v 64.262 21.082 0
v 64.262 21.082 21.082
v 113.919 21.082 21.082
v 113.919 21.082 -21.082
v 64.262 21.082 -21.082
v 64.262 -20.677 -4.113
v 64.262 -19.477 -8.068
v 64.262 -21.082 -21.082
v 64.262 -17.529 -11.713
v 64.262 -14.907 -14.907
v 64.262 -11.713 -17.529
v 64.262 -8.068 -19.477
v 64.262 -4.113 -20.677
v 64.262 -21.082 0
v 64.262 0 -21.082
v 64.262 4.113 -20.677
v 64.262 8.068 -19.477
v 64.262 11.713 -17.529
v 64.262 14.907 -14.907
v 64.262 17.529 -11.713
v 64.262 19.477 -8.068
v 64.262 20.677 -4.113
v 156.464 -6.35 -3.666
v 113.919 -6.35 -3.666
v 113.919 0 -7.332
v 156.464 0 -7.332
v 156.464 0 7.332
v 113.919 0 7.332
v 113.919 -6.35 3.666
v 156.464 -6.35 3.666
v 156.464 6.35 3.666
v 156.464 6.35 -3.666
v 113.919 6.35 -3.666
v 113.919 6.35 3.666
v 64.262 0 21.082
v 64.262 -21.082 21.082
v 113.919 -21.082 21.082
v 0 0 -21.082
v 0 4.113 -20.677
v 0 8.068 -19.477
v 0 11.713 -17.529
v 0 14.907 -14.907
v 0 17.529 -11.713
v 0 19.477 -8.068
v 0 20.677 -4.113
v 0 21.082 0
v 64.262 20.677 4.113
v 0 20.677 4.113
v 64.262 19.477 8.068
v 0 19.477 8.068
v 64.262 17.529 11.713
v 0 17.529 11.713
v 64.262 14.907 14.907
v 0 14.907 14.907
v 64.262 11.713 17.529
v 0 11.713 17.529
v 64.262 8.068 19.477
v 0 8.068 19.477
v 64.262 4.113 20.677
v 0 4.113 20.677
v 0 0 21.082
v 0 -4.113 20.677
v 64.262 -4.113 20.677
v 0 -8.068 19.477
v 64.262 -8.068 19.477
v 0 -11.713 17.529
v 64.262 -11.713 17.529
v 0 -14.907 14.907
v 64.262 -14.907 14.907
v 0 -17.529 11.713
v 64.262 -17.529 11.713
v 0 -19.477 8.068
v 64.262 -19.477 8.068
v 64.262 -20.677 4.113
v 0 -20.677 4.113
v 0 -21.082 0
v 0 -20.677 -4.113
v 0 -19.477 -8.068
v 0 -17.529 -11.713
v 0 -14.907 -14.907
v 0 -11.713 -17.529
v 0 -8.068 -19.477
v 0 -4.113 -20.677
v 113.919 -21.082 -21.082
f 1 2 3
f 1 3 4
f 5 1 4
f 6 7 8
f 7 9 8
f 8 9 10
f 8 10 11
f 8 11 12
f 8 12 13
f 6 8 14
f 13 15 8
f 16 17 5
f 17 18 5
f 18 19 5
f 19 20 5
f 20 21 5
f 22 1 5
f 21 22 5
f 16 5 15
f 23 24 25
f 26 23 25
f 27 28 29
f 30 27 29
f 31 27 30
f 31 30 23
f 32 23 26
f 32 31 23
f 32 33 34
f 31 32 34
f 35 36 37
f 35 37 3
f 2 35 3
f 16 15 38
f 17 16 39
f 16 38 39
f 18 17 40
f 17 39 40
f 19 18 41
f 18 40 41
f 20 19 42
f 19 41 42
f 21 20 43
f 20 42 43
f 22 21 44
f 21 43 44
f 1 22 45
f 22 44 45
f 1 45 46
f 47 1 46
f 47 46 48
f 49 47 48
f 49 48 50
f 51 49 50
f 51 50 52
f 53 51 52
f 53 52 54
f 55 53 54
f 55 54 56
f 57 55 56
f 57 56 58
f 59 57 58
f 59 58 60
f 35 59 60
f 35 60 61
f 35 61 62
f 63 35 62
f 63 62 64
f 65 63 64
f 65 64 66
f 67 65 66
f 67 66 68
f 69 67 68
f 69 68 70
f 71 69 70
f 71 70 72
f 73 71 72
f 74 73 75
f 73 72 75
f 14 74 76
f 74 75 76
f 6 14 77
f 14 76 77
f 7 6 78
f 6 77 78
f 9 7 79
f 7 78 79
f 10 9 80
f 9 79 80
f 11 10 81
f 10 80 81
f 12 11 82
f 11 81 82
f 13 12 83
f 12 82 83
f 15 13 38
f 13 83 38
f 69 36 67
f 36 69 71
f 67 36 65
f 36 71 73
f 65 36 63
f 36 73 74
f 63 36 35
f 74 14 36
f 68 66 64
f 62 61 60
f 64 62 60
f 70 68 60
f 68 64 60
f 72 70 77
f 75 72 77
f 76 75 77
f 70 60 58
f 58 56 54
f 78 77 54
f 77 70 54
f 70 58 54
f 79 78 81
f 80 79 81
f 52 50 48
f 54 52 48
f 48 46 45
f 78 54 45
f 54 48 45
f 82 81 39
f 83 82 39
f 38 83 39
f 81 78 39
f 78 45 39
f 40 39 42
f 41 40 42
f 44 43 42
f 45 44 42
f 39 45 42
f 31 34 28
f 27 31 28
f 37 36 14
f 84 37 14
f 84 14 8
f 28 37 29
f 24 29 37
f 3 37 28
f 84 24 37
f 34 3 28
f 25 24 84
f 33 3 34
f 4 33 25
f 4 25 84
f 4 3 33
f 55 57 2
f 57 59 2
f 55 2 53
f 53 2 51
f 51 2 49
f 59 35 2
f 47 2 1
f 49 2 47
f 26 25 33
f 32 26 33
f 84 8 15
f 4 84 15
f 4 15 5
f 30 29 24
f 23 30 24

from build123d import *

# Parameters (mm, degrees)
SKETCH1_R           = 21.082
BOSS_EXTRUDE1_DEPTH = 64.262
SKETCH2_W           = 42.164
SKETCH2_H           = 42.164
BOSS_EXTRUDE2_DEPTH = 49.657
BOSS_EXTRUDE3_DEPTH = 42.545


with BuildPart() as part:
    # Sketch1 → Boss-Extrude1 (new body)
    with BuildSketch(Plane(origin=(0, 0, 0), x_dir=(0, 0, -1), z_dir=(1, 0, 0))):
        Circle(SKETCH1_R)
    extrude(amount=BOSS_EXTRUDE1_DEPTH)

    # Sketch2 → Boss-Extrude2 (add)
    with BuildSketch(Plane(origin=(64.262, 0, 0), x_dir=(0, 0, -1), z_dir=(1, 0, 0))):
        Rectangle(SKETCH2_W, SKETCH2_H)
    extrude(amount=BOSS_EXTRUDE2_DEPTH)

    # Sketch3 → Boss-Extrude3 (add)
    with BuildSketch(Plane(origin=(113.919, 0, 0), x_dir=(0, 0, -1), z_dir=(1, 0, 0))):
        Polygon((7.332348419, 0), (3.666174209, 6.35), (-3.666174209, 6.35), (-7.332348419, 0), (-3.666174209, -6.35), (3.666174209, -6.35), align=None)
    extrude(amount=BOSS_EXTRUDE3_DEPTH)


solid = part.part
